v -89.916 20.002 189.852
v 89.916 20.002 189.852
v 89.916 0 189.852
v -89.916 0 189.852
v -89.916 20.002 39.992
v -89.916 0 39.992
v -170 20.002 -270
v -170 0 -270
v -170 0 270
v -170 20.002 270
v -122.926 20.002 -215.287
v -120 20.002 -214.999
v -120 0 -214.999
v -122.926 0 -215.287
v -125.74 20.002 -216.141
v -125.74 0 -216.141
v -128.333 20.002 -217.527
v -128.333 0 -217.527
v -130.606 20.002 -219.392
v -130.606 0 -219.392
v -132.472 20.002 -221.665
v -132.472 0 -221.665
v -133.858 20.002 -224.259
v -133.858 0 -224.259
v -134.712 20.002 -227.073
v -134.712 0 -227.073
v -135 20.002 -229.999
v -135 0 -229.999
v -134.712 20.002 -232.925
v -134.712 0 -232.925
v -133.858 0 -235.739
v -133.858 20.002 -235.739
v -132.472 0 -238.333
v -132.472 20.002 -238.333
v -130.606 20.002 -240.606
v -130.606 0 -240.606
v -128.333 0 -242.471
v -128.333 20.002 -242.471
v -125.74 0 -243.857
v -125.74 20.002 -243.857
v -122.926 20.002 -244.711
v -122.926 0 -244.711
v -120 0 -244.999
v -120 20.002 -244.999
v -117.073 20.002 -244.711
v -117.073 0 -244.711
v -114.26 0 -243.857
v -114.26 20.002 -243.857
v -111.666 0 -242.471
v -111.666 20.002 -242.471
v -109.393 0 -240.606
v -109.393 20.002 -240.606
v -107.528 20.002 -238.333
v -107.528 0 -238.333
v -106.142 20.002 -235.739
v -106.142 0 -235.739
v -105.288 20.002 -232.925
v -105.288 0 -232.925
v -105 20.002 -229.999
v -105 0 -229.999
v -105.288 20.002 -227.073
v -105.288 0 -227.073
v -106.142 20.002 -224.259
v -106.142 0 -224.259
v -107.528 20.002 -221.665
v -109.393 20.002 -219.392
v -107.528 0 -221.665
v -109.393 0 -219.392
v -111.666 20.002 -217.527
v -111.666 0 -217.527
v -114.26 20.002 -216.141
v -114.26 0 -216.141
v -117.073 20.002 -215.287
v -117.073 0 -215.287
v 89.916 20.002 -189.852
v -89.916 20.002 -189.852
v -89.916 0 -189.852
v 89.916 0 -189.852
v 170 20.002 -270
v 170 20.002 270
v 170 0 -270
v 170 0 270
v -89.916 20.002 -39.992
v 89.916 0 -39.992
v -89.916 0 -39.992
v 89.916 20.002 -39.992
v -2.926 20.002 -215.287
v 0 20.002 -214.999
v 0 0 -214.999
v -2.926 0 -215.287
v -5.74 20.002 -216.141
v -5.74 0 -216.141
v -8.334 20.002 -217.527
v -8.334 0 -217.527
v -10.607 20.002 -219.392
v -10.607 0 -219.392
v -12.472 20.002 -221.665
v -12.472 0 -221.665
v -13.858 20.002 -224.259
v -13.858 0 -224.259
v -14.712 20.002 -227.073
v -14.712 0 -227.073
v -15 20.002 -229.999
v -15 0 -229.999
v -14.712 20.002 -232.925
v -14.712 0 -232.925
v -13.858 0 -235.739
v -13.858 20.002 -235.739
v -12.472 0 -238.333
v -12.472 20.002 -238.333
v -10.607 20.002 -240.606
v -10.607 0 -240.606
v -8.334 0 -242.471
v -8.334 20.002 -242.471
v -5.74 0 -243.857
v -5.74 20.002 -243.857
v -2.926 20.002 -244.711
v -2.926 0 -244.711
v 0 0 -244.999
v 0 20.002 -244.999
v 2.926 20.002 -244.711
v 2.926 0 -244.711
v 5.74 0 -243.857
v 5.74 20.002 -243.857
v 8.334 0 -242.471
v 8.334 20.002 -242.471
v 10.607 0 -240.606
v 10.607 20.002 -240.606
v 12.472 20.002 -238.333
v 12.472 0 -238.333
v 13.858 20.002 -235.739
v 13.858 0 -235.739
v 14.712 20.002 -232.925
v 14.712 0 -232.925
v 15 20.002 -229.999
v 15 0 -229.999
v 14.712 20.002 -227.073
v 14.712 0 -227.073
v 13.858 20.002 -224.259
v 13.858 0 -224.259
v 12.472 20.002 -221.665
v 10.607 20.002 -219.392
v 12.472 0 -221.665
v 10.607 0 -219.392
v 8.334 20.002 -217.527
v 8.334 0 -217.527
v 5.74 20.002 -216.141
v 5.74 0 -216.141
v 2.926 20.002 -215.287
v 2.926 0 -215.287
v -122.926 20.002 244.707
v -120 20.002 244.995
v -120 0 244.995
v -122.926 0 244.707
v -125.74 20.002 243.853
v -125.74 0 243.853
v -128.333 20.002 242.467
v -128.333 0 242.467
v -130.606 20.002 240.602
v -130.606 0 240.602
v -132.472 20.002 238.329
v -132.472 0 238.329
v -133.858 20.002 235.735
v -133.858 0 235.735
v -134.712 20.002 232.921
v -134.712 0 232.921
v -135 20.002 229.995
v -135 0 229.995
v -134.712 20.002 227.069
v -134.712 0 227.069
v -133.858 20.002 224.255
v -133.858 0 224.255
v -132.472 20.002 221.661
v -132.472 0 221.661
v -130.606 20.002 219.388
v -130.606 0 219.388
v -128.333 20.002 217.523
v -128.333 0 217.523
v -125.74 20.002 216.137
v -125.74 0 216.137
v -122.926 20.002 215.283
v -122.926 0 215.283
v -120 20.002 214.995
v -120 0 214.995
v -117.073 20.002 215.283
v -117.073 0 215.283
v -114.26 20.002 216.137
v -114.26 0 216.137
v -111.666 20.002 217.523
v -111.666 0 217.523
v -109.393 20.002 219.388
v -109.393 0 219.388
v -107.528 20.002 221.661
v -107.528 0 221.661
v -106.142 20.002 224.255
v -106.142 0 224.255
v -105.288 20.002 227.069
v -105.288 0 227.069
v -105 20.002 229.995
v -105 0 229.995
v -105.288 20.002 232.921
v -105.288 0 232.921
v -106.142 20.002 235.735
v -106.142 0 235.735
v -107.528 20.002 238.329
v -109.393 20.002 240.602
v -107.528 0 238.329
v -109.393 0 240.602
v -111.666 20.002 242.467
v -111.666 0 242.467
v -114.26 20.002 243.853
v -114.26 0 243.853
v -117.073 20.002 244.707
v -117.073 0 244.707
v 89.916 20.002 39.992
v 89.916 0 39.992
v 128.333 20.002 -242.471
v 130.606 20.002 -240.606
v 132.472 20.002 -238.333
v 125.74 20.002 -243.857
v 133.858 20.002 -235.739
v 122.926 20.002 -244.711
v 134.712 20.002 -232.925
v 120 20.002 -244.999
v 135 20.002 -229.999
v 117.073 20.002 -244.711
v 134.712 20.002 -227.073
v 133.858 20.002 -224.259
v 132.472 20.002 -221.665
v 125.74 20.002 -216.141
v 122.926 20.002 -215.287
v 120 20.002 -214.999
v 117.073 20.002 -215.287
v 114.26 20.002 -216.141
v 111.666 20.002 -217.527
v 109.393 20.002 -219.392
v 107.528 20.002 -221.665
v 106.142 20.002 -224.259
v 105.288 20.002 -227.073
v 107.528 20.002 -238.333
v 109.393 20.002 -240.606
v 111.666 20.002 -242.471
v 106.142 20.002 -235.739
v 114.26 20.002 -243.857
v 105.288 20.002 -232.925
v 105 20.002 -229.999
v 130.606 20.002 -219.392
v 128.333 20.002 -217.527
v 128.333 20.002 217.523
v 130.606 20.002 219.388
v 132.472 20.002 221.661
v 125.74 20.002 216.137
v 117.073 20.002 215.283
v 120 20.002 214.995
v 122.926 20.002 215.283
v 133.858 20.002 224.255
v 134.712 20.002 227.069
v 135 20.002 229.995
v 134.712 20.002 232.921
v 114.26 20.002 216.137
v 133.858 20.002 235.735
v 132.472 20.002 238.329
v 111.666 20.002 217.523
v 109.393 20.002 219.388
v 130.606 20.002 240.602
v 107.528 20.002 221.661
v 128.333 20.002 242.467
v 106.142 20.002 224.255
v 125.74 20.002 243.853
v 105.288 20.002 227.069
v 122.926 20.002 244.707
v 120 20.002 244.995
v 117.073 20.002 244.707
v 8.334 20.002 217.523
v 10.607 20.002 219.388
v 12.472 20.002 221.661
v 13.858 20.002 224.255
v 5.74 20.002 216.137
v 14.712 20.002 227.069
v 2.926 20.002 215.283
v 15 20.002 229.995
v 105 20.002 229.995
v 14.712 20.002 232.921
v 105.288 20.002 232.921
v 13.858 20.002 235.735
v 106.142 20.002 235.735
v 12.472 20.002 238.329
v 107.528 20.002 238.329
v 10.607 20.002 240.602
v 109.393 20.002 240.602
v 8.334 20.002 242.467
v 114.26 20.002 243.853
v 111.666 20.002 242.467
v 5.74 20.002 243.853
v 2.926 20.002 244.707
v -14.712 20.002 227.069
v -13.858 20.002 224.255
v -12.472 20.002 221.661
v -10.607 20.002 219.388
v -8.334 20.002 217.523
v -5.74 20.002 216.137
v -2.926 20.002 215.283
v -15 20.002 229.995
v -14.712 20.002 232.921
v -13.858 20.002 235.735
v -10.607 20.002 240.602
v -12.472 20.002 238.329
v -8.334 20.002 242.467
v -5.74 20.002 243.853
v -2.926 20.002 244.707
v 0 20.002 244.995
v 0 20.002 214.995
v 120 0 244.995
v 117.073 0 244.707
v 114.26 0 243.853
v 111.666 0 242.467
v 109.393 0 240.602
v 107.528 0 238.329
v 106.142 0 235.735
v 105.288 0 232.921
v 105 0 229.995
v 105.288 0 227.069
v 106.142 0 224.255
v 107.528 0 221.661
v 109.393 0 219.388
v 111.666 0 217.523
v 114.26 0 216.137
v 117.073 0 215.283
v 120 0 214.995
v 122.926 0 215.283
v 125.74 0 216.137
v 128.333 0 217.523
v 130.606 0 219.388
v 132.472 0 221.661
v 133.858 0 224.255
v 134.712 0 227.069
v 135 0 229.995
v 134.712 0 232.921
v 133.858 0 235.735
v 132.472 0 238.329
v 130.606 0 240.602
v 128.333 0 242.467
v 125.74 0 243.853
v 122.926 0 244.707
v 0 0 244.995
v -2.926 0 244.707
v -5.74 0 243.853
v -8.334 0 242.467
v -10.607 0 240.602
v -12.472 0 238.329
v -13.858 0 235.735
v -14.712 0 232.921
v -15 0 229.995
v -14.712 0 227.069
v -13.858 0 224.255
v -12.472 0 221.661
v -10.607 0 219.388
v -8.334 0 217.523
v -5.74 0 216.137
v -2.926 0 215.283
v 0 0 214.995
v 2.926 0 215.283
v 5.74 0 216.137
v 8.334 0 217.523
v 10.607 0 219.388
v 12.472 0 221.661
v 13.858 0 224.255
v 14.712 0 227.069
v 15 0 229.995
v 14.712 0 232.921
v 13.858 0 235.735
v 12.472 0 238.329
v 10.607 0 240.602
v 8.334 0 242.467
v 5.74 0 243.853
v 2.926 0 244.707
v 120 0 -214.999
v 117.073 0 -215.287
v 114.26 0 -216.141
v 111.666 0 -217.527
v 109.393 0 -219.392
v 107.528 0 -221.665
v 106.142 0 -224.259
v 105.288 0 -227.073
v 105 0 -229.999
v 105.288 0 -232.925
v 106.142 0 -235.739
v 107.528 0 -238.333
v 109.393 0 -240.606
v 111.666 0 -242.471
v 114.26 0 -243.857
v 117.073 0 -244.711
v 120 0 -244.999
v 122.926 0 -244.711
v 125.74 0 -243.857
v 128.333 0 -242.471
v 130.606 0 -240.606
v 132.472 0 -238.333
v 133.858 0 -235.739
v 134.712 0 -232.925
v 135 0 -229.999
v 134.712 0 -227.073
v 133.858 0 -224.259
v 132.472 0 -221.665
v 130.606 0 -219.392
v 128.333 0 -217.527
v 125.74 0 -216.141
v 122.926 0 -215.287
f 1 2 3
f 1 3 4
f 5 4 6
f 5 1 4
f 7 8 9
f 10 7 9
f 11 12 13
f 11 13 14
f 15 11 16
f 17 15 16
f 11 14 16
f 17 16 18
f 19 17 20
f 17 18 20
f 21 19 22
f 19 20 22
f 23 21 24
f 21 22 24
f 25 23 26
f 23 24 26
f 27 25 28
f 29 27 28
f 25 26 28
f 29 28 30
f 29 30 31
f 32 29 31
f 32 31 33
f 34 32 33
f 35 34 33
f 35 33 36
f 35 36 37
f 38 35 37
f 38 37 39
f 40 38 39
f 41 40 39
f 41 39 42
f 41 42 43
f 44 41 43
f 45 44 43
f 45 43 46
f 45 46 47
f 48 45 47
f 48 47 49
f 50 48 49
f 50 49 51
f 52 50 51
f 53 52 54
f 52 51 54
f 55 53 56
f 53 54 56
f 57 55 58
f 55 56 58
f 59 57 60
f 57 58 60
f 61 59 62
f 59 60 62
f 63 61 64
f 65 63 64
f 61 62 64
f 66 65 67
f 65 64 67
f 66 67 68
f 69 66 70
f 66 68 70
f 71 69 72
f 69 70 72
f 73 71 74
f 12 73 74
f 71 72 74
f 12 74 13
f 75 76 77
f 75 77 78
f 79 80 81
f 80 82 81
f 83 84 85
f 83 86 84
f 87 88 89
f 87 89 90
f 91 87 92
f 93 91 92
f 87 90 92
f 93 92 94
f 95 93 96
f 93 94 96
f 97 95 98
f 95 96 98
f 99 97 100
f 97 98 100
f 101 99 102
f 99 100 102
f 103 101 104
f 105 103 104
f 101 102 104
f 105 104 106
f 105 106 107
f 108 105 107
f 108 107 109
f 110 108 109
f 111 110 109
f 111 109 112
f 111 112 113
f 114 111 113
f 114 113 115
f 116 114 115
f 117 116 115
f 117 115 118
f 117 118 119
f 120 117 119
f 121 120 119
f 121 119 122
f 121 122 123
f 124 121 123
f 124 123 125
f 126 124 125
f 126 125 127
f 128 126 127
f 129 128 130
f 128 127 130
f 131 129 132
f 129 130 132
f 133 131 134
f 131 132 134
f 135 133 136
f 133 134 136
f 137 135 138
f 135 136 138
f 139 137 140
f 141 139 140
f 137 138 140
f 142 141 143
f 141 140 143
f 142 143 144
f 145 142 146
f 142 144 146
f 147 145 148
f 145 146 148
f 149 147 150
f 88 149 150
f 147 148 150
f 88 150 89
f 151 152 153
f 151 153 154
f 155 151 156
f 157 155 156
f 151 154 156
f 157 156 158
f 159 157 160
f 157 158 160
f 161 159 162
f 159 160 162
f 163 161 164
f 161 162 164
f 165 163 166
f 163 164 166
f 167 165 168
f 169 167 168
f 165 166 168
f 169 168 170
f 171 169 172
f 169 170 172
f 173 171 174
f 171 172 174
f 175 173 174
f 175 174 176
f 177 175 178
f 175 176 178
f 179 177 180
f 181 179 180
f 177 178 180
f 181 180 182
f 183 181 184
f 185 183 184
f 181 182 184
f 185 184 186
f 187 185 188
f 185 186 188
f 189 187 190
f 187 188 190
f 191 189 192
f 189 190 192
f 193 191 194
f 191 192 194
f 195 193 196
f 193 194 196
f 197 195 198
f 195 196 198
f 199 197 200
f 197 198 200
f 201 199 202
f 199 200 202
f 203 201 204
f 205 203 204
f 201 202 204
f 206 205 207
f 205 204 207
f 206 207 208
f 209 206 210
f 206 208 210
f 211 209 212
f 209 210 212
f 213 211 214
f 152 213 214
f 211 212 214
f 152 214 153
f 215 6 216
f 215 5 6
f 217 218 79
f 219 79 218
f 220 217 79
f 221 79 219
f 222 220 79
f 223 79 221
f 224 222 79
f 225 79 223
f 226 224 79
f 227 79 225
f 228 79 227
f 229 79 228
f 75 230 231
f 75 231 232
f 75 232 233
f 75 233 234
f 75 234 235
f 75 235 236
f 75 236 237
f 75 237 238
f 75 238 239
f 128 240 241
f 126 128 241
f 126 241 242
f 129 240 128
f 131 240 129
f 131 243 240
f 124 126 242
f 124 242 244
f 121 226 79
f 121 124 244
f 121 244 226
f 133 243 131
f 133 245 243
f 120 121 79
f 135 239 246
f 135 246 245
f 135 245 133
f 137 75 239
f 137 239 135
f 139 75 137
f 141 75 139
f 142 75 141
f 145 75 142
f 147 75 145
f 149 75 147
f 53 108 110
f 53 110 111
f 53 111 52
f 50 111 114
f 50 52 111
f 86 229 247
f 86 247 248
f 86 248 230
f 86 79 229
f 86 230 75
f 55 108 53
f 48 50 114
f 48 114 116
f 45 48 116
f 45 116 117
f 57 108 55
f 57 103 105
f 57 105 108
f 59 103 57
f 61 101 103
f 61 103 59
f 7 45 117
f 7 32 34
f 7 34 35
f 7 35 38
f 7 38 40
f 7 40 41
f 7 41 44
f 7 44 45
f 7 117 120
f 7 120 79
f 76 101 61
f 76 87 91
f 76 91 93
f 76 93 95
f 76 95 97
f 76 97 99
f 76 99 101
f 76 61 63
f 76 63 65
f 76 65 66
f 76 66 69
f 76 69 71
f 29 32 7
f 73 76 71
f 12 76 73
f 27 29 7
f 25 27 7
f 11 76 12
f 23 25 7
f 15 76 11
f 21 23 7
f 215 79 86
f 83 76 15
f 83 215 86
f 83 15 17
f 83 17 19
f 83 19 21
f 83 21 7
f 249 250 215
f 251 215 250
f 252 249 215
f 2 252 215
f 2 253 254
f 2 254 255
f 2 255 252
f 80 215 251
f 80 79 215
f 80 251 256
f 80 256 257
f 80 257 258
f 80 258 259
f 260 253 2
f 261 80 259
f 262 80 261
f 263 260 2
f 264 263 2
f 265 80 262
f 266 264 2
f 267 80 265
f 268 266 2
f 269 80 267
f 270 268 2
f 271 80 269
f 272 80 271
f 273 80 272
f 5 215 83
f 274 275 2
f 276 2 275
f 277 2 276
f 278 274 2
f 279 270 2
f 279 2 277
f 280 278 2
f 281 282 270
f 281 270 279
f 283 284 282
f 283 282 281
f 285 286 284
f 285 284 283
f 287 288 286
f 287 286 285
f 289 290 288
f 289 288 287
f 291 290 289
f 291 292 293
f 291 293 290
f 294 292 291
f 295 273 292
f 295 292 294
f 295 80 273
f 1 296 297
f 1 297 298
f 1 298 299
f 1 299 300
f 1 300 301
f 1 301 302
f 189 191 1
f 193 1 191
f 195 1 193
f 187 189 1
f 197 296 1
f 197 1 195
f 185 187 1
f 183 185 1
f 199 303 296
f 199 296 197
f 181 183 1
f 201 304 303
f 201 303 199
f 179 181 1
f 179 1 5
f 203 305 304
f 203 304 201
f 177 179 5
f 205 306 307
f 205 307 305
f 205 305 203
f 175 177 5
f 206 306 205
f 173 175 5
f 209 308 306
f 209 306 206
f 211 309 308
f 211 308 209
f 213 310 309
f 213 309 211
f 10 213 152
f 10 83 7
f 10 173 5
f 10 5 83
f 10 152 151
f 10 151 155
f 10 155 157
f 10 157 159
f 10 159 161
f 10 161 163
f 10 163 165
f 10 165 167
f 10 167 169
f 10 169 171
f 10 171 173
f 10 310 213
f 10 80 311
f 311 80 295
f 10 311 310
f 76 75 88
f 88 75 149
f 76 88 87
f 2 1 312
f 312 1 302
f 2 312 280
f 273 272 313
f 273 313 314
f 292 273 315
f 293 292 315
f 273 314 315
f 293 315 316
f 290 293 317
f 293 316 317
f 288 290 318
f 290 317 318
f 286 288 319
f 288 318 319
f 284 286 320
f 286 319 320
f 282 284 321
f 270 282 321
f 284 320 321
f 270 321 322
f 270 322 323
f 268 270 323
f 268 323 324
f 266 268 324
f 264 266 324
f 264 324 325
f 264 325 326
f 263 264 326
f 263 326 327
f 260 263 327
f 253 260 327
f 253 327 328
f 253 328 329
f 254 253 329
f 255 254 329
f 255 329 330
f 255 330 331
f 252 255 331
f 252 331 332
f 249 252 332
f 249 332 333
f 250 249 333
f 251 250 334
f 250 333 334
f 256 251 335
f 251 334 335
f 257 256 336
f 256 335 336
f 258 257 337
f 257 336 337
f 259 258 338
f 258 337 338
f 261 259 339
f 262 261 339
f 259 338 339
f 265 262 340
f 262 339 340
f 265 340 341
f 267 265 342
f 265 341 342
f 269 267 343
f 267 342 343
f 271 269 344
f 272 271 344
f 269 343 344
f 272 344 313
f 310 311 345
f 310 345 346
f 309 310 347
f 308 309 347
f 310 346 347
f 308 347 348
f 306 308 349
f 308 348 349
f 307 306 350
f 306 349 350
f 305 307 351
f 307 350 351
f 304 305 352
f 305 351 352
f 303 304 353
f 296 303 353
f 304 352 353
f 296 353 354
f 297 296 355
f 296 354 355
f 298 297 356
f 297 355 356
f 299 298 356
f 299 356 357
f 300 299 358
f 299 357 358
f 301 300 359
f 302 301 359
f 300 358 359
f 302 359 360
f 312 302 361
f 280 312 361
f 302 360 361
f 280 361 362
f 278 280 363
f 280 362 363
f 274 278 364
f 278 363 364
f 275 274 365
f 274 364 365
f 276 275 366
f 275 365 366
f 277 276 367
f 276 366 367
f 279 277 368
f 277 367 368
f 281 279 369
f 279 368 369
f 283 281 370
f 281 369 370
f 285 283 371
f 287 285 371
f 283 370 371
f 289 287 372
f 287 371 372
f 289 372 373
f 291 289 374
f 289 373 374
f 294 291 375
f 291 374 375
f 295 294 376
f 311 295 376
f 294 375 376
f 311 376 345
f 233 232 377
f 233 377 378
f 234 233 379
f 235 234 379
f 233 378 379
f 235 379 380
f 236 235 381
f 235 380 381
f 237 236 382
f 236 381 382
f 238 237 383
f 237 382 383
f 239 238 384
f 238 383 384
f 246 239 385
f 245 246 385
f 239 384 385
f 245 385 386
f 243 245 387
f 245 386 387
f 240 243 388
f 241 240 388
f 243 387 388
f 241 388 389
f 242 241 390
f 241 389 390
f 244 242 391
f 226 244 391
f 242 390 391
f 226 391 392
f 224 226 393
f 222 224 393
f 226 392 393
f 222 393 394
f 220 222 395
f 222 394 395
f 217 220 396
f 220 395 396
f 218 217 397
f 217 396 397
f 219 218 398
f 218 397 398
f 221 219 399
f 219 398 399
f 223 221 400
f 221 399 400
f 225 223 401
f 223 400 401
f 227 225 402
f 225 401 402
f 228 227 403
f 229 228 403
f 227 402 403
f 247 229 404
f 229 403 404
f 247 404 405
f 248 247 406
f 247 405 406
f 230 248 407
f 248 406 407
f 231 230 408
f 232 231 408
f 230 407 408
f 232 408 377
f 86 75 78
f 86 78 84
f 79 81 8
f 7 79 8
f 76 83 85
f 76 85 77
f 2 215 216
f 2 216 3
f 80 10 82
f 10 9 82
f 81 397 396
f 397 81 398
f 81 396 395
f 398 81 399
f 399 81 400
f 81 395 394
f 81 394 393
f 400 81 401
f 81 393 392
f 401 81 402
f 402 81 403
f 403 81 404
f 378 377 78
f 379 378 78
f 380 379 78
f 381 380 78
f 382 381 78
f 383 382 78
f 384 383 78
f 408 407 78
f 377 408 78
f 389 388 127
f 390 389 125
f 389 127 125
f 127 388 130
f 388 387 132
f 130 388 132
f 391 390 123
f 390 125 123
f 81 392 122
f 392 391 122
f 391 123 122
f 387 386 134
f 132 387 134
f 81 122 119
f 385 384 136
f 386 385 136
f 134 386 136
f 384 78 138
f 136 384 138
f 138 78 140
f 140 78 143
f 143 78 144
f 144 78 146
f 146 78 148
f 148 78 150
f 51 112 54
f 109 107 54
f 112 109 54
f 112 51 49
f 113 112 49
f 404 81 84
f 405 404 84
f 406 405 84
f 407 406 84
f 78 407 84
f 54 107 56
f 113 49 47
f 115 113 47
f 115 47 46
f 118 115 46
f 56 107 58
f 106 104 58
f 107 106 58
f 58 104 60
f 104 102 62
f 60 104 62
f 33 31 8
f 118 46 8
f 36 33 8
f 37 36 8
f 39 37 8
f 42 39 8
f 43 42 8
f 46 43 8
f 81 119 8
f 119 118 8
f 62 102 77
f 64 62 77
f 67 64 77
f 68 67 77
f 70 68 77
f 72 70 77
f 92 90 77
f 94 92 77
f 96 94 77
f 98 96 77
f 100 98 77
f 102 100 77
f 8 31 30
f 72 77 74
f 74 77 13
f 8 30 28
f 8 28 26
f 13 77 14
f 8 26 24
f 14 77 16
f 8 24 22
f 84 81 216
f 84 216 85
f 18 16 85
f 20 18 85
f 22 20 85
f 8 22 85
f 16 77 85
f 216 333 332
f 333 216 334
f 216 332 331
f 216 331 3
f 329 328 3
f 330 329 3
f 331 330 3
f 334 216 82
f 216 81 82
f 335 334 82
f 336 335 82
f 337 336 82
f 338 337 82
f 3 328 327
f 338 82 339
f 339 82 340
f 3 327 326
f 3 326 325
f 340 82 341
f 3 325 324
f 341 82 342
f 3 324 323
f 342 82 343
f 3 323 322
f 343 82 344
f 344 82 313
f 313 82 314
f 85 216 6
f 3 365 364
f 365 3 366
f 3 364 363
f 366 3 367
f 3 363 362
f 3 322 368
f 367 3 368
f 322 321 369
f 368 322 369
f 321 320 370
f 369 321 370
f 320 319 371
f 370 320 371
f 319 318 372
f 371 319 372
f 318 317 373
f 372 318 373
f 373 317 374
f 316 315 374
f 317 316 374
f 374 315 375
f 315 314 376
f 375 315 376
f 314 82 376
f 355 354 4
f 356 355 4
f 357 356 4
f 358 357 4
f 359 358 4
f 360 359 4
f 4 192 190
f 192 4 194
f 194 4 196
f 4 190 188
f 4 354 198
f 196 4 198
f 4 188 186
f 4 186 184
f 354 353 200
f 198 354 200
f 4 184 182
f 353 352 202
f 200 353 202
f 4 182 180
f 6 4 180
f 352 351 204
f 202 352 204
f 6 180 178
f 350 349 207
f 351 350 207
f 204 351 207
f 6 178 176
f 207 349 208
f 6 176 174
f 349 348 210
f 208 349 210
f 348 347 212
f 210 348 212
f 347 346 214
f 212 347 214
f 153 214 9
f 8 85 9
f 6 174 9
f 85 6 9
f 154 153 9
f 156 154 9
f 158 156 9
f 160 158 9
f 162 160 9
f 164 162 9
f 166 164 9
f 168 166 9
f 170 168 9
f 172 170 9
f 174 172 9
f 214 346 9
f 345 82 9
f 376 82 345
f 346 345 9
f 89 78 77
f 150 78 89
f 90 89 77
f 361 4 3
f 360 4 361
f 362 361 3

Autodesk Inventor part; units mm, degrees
ref_plane "YZ Plane" through (0, 0, 0) normal (1, 0, 0) x (0, 1, 0)
ref_plane "XZ Plane" through (0, 0, 0) normal (0, 1, 0) x (-1, 0, 0)
ref_plane "XY Plane" through (0, 0, 0) normal (0, 0, 1) x (1, 0, 0)
sketch "Sketch1" plane through (0, 0, 0) normal (0, 1, 0) x (-1, 0, 0)
  line L0 (169.9997, 270) -> (-169.9997, 270)
  line L1 (-169.9997, 270) -> (-169.9997, -270)
  line L2 (-169.9997, -270) -> (169.9997, -270)
  line L3 (169.9997, -270) -> (169.9997, 270)
  line L4 (169.9997, 270) -> (-169.9997, -270) construction
  line L5 (-169.9997, 270) -> (169.9997, -270) construction
  point P0 (0, 0)
  dimension "d0" = 339.9993
  dimension "d1" = 539.9999
extrude "Extrusion1" add sketch "Sketch1" along normal blind 20.0025
sketch "Sketch2" plane through (0, 20.0025, 0) normal (0, 1, 0) x (1, 0, 0)
  line L0 (-89.916, 189.8523) -> (89.916, 189.8523)
  line L1 (89.916, 189.8523) -> (89.916, 39.9923)
  line L2 (89.916, 39.9923) -> (-89.916, 39.9923)
  line L3 (-89.916, 39.9923) -> (-89.916, 189.8523)
  line L4 (-89.916, 189.8523) -> (89.916, 39.9923) construction
  line L5 (89.916, 189.8523) -> (-89.916, 39.9923) construction
  line L6 (-89.916, -39.9923) -> (89.916, -39.9923)
  line L7 (89.916, -39.9923) -> (89.916, -189.8523)
  line L8 (89.916, -189.8523) -> (-89.916, -189.8523)
  line L9 (-89.916, -189.8523) -> (-89.916, -39.9923)
  line L10 (-89.916, -39.9923) -> (89.916, -189.8523) construction
  line L11 (89.916, -39.9923) -> (-89.916, -189.8523) construction
  line L12 (-169.9997, -270) -> (169.9997, -270) projected
  line L13 (0, 0) -> (-323.2387, 0) construction
  point P0 (0, 114.9223)
  point P1 (0, -114.9223)
  point P2 (0, -114.9223)
  dimension "d4" = 149.86
  dimension "d5" = 149.86
  dimension "d6" = 179.832
  dimension "d7" = 179.832
  dimension "d9" = 79.9846
extrude "Extrusion2" cut sketch "Sketch2" against normal through all
hole "Hole1" at (-119.9998, 20.0025, 229.995) direction (0, -1, 0) diameter 29.9999 end through all
pattern_linear "Rectangular Pattern1" count 2 spacing 459.994 along (0, 0, -1) count 3 spacing 119.9998 along (1, 0, 0) of "Hole1"
